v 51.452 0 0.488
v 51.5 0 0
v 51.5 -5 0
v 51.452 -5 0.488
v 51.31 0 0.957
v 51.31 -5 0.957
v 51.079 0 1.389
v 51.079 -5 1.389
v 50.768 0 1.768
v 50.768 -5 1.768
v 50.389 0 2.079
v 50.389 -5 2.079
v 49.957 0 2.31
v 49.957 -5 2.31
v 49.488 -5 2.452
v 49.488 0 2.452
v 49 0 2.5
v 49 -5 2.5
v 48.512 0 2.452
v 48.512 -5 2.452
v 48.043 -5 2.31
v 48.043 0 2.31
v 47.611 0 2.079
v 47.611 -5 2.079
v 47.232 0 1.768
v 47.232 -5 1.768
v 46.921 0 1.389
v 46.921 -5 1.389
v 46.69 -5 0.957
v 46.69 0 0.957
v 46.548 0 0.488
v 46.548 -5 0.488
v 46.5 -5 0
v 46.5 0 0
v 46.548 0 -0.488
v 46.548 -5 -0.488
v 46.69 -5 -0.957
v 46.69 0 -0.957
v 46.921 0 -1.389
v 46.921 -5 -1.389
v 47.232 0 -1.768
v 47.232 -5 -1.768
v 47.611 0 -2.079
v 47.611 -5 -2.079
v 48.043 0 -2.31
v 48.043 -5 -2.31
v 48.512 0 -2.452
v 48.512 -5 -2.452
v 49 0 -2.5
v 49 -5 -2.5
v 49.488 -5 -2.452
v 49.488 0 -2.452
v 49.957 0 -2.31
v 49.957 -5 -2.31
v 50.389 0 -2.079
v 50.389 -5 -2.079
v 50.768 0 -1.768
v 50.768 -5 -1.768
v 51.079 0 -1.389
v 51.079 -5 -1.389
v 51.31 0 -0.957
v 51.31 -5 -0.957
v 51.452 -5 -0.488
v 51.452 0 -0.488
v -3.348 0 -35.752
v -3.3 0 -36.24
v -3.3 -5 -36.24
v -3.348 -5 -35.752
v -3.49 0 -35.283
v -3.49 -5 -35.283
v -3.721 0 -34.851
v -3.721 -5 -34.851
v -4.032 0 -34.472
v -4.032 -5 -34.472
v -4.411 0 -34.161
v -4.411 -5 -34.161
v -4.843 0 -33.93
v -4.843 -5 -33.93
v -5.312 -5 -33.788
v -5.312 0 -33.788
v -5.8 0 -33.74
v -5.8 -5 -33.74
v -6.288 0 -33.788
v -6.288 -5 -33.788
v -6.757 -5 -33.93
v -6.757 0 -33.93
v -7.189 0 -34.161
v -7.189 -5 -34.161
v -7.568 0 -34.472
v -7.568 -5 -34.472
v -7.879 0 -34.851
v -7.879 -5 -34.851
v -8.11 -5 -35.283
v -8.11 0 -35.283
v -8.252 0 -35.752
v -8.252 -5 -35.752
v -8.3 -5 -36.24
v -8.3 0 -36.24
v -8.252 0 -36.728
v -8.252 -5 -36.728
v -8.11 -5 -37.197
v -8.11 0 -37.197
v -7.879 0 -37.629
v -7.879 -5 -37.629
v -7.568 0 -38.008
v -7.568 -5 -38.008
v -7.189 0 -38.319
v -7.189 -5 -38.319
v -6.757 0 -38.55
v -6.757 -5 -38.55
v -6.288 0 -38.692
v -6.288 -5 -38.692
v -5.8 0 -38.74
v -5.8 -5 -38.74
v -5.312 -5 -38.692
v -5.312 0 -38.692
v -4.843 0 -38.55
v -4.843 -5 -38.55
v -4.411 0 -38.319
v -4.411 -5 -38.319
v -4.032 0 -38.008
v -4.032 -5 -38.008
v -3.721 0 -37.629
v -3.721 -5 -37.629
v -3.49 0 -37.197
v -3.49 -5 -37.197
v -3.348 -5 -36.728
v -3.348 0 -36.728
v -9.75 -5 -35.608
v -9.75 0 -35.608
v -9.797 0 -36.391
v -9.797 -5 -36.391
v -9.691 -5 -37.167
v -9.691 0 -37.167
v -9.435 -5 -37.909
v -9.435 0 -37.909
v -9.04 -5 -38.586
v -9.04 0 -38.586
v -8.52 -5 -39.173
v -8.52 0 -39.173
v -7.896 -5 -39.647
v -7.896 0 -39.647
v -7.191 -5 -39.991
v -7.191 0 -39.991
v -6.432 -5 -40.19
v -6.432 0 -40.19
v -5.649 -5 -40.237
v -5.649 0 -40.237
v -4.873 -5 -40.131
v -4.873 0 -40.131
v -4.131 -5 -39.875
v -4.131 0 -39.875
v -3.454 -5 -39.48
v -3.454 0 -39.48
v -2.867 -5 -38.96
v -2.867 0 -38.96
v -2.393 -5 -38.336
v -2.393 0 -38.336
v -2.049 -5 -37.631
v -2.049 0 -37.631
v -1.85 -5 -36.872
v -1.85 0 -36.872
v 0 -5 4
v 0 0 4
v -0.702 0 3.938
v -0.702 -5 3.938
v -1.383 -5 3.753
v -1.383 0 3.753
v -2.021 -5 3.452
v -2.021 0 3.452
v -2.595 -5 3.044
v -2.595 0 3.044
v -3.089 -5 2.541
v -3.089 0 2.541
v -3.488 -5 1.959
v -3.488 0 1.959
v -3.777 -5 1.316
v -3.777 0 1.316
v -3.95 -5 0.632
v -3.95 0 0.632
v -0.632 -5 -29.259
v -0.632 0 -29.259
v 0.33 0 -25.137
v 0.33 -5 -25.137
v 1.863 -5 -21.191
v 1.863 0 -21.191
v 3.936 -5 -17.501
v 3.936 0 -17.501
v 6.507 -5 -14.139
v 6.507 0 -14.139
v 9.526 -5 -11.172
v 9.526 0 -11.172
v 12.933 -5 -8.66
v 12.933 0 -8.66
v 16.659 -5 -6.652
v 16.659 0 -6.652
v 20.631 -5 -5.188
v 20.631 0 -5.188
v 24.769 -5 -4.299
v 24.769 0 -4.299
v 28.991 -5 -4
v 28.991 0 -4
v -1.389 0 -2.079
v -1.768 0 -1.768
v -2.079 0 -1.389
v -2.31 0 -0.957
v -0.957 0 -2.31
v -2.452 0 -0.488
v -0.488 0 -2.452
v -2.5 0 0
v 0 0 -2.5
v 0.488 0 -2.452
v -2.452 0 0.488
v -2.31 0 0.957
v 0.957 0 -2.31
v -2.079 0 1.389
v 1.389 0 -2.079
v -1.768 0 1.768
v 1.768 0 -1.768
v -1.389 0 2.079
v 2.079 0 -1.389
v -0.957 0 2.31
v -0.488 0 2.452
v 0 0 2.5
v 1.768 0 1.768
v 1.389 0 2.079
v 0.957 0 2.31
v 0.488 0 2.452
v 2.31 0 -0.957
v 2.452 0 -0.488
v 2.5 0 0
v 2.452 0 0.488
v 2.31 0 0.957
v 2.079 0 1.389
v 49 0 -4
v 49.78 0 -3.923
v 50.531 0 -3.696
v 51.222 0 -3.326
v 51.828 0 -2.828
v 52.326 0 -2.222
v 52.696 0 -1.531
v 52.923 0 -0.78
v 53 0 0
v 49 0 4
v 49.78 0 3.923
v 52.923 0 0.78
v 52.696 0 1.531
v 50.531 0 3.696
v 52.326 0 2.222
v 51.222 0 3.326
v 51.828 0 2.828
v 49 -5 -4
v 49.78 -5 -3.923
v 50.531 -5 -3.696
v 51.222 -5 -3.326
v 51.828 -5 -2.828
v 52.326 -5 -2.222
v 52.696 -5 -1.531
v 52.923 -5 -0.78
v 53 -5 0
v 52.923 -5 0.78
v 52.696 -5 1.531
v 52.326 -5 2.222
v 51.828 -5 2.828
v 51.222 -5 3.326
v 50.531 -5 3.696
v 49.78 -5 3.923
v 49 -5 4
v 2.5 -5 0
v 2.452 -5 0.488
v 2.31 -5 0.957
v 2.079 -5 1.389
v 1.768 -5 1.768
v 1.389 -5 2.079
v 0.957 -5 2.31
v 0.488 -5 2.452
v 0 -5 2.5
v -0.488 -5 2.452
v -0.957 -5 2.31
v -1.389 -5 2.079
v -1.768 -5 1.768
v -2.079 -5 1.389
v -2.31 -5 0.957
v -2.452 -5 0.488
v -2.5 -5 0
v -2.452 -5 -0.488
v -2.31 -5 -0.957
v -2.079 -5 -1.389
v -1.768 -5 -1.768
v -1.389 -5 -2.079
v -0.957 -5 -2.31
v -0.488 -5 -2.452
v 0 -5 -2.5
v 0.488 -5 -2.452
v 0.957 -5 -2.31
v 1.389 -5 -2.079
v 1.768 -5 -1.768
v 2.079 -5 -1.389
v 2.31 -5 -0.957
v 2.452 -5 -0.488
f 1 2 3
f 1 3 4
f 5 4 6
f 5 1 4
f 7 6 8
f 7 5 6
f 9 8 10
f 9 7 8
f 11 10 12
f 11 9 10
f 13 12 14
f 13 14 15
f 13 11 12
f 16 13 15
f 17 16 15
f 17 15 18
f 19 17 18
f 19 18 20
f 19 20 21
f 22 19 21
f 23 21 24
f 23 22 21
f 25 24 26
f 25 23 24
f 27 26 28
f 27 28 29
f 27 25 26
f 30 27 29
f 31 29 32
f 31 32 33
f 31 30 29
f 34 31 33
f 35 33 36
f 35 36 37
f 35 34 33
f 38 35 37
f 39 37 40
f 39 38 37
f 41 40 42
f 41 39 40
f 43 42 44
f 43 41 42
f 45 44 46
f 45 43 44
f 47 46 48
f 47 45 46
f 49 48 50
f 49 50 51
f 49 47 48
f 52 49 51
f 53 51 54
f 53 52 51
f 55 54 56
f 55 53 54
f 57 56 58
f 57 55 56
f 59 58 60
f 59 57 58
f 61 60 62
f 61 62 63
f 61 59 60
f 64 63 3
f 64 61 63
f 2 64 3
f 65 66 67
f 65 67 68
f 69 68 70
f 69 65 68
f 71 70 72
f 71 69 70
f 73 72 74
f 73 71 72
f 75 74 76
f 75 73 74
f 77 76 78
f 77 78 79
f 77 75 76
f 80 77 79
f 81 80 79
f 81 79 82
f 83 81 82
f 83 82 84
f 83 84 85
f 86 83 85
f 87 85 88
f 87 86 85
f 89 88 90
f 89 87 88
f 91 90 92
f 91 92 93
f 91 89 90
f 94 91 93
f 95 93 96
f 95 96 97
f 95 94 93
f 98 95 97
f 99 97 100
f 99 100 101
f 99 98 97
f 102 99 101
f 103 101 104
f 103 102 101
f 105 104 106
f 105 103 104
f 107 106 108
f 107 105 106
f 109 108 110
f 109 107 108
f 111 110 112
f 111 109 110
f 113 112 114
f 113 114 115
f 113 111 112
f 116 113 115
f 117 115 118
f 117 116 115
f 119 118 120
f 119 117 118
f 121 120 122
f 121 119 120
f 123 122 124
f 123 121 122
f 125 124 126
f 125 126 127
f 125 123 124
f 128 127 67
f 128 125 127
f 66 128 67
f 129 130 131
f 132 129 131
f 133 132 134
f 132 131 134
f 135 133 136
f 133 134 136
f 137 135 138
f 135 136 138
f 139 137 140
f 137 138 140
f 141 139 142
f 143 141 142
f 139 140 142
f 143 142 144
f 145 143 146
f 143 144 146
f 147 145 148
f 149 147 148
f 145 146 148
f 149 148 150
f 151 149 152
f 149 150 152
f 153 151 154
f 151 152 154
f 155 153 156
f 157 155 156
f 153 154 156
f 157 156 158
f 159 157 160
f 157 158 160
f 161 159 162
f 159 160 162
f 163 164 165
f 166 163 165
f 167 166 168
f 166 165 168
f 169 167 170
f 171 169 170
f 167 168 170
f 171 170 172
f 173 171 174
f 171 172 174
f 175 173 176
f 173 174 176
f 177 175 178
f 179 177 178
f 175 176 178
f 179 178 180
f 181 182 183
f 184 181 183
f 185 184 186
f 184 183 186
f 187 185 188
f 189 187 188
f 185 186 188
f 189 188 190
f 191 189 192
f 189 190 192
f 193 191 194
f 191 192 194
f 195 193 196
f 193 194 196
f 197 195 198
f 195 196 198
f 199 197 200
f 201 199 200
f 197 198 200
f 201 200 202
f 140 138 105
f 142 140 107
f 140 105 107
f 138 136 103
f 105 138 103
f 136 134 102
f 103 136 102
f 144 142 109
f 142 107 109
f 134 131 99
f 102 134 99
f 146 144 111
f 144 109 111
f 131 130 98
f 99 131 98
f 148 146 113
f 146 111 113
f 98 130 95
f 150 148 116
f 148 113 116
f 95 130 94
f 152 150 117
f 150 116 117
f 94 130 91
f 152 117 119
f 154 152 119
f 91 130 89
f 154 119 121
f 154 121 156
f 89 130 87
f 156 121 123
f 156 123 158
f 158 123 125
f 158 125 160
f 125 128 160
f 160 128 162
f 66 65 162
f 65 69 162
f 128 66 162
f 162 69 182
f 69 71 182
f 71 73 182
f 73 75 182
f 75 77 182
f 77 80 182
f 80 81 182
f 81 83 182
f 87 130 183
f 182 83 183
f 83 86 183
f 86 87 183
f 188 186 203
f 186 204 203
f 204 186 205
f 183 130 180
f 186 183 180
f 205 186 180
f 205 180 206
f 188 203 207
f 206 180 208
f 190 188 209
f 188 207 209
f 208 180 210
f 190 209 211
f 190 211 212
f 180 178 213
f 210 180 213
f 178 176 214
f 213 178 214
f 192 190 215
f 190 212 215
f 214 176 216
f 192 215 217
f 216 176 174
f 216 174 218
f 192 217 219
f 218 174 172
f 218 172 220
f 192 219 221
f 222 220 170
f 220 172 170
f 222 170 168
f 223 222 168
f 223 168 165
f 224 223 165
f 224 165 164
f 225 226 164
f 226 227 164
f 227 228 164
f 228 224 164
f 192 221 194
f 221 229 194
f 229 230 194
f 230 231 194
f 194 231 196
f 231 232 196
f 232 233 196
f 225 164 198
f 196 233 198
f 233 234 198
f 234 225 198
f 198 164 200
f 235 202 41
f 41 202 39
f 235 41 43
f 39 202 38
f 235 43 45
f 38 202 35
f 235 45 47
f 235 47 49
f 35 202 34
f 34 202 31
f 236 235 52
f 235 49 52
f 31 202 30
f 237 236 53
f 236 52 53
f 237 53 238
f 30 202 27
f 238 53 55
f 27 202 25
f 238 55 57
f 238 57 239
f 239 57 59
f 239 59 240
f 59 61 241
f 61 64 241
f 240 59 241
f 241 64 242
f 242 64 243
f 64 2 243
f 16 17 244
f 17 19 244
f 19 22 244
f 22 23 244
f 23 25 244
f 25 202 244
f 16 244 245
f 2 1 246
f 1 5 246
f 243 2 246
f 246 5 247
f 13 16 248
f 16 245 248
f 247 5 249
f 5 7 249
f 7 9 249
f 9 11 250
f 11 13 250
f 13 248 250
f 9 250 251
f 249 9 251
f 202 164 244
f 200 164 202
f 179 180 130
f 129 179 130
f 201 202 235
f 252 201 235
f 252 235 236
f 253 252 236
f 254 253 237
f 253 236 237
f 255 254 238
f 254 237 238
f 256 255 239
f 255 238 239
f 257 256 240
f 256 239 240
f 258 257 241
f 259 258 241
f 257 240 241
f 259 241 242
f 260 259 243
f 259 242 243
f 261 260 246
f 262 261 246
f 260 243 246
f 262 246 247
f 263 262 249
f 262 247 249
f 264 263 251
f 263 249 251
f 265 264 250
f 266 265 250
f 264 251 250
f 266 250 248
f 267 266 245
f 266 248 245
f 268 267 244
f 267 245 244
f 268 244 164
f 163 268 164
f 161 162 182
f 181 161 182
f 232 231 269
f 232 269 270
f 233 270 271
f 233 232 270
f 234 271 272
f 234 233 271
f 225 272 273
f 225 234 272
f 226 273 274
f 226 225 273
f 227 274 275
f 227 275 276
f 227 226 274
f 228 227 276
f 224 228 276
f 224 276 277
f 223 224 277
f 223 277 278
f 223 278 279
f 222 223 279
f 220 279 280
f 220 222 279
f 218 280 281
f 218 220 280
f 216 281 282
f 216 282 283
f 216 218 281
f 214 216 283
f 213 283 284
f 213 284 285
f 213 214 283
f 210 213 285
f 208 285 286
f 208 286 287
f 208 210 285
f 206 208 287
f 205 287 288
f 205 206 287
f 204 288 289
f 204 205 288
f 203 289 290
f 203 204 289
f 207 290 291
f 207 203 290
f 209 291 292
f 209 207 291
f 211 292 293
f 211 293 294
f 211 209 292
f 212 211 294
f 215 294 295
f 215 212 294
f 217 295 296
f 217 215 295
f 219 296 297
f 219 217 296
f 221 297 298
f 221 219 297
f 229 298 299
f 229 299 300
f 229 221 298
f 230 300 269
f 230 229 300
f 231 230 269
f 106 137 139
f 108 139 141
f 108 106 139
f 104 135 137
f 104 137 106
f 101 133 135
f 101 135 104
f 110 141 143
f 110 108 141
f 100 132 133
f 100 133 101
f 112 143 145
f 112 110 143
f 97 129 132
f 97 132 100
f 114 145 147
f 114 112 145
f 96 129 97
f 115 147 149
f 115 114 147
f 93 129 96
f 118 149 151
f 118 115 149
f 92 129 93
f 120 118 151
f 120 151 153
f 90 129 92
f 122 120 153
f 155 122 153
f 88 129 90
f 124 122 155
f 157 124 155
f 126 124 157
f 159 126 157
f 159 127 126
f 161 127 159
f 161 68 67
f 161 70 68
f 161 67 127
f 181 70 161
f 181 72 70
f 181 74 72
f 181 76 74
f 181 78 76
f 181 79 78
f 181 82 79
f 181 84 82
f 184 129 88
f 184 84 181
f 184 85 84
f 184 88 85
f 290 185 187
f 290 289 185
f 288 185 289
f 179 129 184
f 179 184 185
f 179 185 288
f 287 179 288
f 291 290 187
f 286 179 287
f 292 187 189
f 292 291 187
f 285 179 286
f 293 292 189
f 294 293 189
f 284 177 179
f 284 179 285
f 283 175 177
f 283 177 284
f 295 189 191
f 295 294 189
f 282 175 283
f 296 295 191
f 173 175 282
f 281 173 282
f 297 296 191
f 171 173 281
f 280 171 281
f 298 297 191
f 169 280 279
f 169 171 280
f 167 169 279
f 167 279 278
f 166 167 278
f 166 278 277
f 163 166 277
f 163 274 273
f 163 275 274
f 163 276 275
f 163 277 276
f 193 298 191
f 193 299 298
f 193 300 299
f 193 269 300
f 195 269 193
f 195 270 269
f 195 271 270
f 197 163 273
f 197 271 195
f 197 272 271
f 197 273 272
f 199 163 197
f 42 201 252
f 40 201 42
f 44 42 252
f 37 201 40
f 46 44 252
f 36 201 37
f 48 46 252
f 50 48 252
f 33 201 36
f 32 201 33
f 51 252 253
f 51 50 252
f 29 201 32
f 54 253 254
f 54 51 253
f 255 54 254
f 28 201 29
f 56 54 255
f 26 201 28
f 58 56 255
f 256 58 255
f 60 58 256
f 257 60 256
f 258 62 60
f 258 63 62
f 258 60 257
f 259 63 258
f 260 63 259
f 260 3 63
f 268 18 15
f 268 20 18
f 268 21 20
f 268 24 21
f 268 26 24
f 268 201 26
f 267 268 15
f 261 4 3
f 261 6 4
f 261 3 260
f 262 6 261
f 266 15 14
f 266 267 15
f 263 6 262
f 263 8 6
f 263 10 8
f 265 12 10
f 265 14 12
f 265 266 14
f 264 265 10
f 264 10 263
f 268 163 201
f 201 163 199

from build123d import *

# Parameters (mm, degrees)
F0_R     = 2.5
F1_DEPTH = 5


with BuildPart() as f1:
    # F0 (on Front) → F1 (new body)
    with BuildSketch(Plane.XZ):
        with BuildLine():
            Line((49, 4), (0, 4))
            ThreePointArc((0, 4), (-2.59533, 3.043725), (-3.949735, 0.632132))
            Line((-3.949735, 0.632132), (-9.749735, -35.607868))
            ThreePointArc((-9.749735, -35.607868), (-6.432132, -40.189735), (-1.850265, -36.872132))
            Line((-1.850265, -36.872132), (-0.631829, -29.25901))
            ThreePointArc((-0.631829, -29.25901), (9.526214, -11.17206), (28.991186, -4))
            Line((28.991186, -4), (49, -4))
            ThreePointArc((49, -4), (53, 0), (49, 4))
        make_face()
        with Locations((-5.8, -36.24)):
            Circle(F0_R, mode=Mode.SUBTRACT)
        Circle(F0_R, mode=Mode.SUBTRACT)
        with Locations((49, 0)):
            Circle(F0_R, mode=Mode.SUBTRACT)
    extrude(amount=F1_DEPTH)


solid = f1.part
